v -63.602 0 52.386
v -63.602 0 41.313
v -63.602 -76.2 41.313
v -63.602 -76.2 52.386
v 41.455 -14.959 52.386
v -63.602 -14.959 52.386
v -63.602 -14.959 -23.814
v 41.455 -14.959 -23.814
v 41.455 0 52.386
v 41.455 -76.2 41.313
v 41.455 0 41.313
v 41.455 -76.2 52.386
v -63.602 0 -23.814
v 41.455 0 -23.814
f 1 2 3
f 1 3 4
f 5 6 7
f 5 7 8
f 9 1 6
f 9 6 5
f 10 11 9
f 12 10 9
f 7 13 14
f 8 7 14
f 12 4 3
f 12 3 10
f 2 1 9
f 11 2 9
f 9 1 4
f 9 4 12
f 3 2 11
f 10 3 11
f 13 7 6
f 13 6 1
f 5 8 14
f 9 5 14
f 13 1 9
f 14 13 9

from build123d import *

# Parameters (mm, degrees)
F0_W     = 105.056722
F0_H     = 11.073545
F1_DEPTH = 76.2
F2_W     = 105.056722
F2_H     = 14.959126
F3_DEPTH = 76.2


with BuildPart() as f1:
    # F0 (on Front) → F1 (new body)
    with BuildSketch(Plane.XZ):
        with Locations((-11.073543, 46.849623)):
            Rectangle(F0_W, F0_H)
    extrude(amount=F1_DEPTH)


with BuildPart() as f3:
    # F2 (on face) → F3 (new body)
    with BuildSketch(Plane.XY.offset(52.386396)):
        with Locations((-11.073543, -7.479563)):
            Rectangle(F2_W, F2_H)
    extrude(amount=-F3_DEPTH)


solid = Compound([f1.part, f3.part])
